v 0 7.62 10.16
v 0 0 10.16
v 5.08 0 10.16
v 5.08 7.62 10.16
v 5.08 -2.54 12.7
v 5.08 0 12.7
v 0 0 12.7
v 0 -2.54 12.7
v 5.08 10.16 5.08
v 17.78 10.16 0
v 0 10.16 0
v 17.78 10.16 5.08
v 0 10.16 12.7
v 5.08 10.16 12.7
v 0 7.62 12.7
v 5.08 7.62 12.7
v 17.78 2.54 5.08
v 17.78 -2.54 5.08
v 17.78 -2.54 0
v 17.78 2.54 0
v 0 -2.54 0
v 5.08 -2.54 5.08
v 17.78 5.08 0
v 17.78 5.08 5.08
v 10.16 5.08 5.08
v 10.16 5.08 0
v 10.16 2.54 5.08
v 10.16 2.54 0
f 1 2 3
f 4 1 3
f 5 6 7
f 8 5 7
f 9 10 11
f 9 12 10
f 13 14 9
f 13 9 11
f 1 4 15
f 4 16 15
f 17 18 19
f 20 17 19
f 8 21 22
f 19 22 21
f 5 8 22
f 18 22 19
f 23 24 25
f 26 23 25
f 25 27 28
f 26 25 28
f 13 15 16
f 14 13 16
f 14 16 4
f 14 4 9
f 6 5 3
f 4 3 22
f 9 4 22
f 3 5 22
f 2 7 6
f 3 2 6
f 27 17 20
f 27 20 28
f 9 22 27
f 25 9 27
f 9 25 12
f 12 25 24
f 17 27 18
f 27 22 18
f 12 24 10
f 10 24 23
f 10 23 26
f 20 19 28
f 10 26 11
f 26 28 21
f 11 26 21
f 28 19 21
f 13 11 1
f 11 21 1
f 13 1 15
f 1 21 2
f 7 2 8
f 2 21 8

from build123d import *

# Parameters (mm, degrees)
F1_DEPTH = 2.54
F3_DEPTH = 2.54
F5_DEPTH = 2.54
F7_DEPTH = 2.54
F9_DEPTH = 2.54


with BuildPart() as f1:
    # F0 (on Front) → F1 (new body)
    with BuildSketch(Plane.XZ):
        Polygon((0, 12.7), (0, 0), (17.78, 0), (17.78, 5.08), (5.08, 5.08), (5.08, 12.7), align=None)
    extrude(amount=F1_DEPTH)



with BuildPart() as f3:
    # F2 (on face) → F3 (new body)
    with BuildSketch(Plane(origin=(0, 5.08, 0), x_dir=(-1, 0, 0), z_dir=(0, 1, 0))):
        Polygon((-17.78, 0), (0, 0), (0, 10.16), (-5.08, 10.16), (-5.08, 5.08), (-17.78, 5.08), align=None)
    extrude(amount=F3_DEPTH)

    # F4 (on face) → F5 (join)
    with BuildSketch(Plane(origin=(0, 2.54, 0), x_dir=(-1, 0, 0), z_dir=(0, 1, 0))):
        Polygon((0, 0), (0, 10.16), (-5.08, 10.16), (-5.08, 5.08), (-10.16, 5.08), (-10.16, 0), align=None)
    extrude(amount=F5_DEPTH)


with BuildPart() as f1_1:
    add(f1.part)

    add(f3.part)  # F7 merges F3
    # F6 (on face) → F7 (join)
    with BuildSketch(Plane(origin=(0, 0, 0), x_dir=(-1, 0, 0), z_dir=(0, 1, 0))):
        Polygon((-17.78, 0), (0, 0), (0, 10.16), (-5.08, 10.16), (-5.08, 5.08), (-17.78, 5.08), align=None)
    extrude(amount=F7_DEPTH)

    # F8 (on face) → F9 (join)
    with BuildSketch(Plane(origin=(0, 7.62, 0), x_dir=(-1, 0, 0), z_dir=(0, 1, 0))):
        Polygon((-17.78, 0), (0, 0), (0, 12.7), (-5.08, 12.7), (-5.08, 5.08), (-17.78, 5.08), align=None)
    extrude(amount=F9_DEPTH)


solid = f1_1.part
